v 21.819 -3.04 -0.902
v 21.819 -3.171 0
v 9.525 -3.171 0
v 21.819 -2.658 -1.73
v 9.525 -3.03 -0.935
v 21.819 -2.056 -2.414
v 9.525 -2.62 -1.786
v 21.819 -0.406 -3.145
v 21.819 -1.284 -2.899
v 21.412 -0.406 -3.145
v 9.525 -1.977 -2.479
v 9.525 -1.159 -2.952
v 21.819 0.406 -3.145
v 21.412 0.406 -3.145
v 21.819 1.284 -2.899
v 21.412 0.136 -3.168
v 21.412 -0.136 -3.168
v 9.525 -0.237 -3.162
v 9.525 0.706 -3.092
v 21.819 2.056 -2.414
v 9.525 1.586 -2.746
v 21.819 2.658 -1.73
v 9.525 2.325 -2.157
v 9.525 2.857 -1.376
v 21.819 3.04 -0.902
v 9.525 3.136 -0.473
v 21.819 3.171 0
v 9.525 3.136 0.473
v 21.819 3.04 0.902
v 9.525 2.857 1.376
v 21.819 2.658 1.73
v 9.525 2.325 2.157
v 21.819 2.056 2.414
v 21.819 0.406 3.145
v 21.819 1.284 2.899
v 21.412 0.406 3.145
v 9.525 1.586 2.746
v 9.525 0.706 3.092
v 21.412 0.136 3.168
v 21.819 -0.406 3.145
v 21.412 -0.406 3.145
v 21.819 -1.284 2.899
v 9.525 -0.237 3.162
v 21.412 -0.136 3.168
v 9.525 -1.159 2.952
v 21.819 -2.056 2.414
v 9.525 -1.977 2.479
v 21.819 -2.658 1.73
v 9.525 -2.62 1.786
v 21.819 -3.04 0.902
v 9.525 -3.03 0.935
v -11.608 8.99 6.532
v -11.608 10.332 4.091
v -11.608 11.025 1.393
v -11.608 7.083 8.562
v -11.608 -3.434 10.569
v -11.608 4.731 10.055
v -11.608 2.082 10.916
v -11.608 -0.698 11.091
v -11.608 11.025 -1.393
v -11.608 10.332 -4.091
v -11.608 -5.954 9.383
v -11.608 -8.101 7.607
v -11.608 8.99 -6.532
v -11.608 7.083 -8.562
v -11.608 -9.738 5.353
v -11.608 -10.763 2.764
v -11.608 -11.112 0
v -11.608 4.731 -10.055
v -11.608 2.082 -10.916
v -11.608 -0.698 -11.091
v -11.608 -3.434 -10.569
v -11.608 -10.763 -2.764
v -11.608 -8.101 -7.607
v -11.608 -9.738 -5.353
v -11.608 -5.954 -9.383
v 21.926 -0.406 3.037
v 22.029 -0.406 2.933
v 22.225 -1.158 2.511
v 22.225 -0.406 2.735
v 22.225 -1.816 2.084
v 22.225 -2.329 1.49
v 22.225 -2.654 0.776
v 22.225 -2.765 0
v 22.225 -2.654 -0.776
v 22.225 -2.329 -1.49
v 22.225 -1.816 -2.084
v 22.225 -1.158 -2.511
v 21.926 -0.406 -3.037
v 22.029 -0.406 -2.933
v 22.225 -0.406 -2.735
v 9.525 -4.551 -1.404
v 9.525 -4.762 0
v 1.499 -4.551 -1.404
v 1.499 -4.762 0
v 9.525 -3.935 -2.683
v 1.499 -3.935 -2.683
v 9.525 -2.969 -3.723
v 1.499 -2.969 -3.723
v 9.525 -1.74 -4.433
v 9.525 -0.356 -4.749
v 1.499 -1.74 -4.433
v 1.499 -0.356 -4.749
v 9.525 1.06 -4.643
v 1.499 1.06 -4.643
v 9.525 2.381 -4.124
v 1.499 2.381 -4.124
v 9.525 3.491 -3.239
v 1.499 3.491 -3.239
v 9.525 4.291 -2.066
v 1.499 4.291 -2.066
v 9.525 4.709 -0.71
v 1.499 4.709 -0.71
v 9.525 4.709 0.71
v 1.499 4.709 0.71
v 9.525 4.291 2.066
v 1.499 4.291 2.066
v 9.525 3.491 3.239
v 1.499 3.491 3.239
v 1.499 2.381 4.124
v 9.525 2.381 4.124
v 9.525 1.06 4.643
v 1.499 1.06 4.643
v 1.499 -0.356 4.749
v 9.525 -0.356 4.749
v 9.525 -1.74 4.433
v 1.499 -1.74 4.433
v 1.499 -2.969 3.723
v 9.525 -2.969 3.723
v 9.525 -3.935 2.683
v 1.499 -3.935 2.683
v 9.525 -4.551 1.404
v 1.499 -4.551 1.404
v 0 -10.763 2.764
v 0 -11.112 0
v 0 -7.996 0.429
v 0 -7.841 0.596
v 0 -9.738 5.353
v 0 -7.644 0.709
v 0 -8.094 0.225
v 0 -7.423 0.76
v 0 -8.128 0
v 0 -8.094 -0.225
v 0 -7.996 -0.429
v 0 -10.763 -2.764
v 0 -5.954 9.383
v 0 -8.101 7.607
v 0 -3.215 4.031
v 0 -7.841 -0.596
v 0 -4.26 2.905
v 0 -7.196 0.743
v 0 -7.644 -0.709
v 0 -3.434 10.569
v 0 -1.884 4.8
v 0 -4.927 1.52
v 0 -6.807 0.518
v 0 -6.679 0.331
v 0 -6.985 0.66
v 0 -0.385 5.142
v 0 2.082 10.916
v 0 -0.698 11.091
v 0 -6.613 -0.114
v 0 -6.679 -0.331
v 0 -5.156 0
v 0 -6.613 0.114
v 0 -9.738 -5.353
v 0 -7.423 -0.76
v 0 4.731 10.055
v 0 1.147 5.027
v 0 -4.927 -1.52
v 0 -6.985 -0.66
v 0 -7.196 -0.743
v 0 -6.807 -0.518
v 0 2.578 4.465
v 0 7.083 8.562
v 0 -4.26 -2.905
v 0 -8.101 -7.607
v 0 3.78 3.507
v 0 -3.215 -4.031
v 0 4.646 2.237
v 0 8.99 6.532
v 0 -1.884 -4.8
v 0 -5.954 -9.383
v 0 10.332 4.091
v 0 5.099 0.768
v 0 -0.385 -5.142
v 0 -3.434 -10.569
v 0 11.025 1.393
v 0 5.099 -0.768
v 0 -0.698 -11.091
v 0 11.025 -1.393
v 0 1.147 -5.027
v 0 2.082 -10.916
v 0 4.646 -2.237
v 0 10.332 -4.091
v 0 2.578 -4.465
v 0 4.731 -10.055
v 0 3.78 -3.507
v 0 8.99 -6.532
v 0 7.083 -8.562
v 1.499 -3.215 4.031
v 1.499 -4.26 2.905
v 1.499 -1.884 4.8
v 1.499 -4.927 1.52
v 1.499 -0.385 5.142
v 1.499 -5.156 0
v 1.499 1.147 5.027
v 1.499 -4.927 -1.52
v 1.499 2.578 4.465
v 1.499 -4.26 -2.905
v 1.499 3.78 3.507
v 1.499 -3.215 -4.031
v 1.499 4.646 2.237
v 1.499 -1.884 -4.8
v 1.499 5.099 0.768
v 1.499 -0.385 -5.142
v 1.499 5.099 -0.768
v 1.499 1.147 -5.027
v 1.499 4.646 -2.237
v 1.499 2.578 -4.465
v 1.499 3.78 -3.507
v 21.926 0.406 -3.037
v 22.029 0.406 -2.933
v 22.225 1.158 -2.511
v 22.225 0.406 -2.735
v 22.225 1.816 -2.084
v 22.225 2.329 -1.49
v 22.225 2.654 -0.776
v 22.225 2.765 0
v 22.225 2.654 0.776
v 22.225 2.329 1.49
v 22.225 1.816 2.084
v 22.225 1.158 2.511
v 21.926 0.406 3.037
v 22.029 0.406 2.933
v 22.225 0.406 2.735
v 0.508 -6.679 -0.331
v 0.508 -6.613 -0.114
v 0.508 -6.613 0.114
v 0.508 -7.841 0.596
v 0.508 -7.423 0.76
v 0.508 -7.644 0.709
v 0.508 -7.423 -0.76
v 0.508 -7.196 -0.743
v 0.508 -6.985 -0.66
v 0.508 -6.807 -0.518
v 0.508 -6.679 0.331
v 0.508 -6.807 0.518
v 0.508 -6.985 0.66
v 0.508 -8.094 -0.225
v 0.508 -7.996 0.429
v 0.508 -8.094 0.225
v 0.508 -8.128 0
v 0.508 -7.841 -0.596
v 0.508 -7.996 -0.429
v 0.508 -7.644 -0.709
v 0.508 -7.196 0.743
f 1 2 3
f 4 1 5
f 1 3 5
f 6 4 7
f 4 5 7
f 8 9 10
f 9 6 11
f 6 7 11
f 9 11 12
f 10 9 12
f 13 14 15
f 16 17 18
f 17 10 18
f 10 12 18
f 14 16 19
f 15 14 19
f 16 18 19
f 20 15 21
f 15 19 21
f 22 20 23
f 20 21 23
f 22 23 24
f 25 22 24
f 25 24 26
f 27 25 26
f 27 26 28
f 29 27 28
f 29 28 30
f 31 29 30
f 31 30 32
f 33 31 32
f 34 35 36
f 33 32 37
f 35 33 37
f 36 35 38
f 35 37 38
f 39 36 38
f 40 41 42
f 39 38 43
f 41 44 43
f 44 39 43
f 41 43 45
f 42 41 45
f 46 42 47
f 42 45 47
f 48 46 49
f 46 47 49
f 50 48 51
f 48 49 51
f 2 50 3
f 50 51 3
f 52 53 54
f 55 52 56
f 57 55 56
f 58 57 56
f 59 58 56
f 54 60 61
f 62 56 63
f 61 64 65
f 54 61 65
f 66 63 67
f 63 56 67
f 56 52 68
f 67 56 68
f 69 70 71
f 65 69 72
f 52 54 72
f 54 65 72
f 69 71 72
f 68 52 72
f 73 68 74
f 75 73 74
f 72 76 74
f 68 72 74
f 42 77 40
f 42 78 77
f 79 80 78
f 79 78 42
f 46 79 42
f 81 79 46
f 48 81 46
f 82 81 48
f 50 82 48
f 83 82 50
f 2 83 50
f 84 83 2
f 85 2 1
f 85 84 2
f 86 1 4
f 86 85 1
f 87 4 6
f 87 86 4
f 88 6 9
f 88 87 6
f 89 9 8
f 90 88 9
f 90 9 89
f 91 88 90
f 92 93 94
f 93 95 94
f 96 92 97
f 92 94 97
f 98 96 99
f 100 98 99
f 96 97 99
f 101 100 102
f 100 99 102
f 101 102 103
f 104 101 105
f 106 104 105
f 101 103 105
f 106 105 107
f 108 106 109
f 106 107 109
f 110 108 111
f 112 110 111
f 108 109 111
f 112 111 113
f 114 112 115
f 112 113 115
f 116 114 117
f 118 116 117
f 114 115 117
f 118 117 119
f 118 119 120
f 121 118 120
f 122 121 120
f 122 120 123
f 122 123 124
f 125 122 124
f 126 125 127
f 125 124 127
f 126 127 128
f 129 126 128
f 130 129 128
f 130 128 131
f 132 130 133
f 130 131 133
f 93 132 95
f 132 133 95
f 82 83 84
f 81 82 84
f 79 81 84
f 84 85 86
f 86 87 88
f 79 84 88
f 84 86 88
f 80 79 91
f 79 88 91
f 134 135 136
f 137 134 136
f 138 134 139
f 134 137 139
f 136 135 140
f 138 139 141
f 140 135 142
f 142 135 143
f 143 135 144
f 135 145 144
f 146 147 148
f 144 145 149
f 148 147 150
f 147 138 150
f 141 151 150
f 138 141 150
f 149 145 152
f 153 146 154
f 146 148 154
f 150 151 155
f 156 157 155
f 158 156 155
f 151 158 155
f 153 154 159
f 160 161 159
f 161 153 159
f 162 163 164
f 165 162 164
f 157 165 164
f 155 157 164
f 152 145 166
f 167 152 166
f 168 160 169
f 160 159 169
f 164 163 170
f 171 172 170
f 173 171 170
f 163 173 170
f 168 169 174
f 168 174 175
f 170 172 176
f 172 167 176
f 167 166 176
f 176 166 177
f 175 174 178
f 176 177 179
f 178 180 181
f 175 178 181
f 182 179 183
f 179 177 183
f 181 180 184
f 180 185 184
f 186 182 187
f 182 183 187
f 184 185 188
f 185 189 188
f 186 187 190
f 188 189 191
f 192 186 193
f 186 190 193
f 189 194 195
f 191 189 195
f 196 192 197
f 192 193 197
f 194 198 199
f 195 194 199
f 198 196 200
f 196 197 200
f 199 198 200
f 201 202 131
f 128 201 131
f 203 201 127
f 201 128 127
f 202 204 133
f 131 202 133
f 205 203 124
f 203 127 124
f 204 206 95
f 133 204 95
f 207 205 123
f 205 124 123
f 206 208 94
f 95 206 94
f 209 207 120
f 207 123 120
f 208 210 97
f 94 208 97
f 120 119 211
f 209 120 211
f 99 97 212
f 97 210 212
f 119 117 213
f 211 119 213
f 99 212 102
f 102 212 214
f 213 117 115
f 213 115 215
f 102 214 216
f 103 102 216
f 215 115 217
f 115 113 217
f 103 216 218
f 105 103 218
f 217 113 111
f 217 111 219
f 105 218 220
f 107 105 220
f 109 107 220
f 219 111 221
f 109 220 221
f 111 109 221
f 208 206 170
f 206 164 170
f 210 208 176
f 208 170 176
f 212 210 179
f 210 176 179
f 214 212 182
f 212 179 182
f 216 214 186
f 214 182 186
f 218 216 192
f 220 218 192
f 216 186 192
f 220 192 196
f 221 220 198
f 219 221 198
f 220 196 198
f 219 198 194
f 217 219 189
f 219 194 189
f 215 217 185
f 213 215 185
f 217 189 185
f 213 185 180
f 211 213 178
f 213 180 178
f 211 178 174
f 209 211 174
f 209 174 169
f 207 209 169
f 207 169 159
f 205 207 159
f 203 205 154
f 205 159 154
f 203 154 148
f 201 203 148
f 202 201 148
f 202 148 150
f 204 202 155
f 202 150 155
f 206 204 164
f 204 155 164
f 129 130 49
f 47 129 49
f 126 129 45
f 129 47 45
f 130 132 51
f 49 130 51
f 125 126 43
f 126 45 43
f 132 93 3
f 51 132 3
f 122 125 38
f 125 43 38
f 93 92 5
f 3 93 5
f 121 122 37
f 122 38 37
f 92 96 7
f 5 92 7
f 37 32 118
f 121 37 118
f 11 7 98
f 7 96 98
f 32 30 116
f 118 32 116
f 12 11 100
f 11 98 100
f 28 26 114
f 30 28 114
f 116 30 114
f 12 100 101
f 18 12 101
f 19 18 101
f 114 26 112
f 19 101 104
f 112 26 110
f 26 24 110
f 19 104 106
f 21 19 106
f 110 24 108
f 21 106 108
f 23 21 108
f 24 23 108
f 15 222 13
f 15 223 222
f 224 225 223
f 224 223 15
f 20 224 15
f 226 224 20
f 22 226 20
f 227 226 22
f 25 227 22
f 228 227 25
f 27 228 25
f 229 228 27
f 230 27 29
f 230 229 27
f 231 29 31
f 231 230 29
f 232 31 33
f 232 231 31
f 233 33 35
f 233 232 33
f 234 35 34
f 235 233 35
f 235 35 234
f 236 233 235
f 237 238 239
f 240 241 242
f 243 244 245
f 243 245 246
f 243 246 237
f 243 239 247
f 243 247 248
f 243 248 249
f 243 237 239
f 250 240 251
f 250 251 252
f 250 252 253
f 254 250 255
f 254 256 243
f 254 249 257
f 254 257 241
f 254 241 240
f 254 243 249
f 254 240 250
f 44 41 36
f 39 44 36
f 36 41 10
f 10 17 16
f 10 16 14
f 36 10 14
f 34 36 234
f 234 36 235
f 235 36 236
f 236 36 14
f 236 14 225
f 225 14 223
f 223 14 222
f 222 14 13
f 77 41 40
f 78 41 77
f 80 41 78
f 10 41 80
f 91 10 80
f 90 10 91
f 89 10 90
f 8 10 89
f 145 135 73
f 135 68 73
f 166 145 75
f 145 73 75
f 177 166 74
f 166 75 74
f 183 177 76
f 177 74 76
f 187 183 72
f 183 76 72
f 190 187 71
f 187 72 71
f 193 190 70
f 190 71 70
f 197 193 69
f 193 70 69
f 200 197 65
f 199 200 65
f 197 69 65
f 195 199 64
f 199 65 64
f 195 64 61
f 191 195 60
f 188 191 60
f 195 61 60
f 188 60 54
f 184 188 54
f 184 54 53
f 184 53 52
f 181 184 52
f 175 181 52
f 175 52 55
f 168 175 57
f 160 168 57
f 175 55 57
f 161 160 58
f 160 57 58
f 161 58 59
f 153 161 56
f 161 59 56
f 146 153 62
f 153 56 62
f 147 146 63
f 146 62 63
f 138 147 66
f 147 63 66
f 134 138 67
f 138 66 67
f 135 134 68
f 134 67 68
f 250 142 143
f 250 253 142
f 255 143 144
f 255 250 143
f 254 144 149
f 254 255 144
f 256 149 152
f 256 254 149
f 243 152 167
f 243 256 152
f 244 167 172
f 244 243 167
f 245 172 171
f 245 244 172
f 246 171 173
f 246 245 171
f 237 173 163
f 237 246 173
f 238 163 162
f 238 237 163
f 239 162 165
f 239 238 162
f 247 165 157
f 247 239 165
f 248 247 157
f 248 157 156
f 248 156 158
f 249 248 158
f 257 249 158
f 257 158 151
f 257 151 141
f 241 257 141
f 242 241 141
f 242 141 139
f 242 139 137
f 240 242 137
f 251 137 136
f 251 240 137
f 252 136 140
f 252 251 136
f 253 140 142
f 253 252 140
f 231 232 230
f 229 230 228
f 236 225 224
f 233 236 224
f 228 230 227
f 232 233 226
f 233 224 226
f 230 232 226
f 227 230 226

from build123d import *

# Parameters (mm, degrees)
SKETCH3_R               = 0.762
BOSS_EXTRUDE1_DEPTH     = 0.508
CUT_EXTRUDE1_DEPTH      = 28.219954767
CUT_EXTRUDE1_DEPTH_BACK = 28.219954767
SKETCH4_W               = 0.8128
SKETCH4_H               = 0.8128
CHAMFER1_SIZE           = 0.4064


with BuildPart() as part:
    # Sketch2 → Revolve1 (revolve)
    with BuildSketch(Plane.XY):
        Polygon((0, 0), (22.225, 0), (22.225, 3.17119), (9.525, 3.17119), (9.525, 4.7625), (1.4986, 4.7625), (1.4986, 5.1562), (0, 5.1562), (0, 11.1125), (-11.6078, 11.1125), (-11.6078, 0), align=None)
    revolve(axis=Axis((22.225, 0, 0), (1, 0, 0)))

    # Sketch3 → Boss-Extrude1 (add, symmetric)
    with BuildSketch(Plane(origin=(0, 0, 0), x_dir=(0, 0, -1), z_dir=(1, 0, 0))):
        with Locations((0, -7.366)):
            Circle(SKETCH3_R)
    extrude(amount=BOSS_EXTRUDE1_DEPTH, both=True)

    # Sketch4 → Cut-Extrude1 (cut, two sides: drawn at the far end of the back side and taken through both)
    with BuildSketch(Plane.XY.offset(-CUT_EXTRUDE1_DEPTH_BACK)):
        with Locations((21.8186, 0)):
            Rectangle(SKETCH4_W, SKETCH4_H)
    extrude(amount=CUT_EXTRUDE1_DEPTH + CUT_EXTRUDE1_DEPTH_BACK, mode=Mode.SUBTRACT)

    # Chamfer1
    chamfer1_edges = [part.edges().sort_by_distance(p)[0] for p in [
        (22.225, -3.17119, 0),
        (22.225, 2.381723917, 2.093761496),
    ]]
    chamfer(chamfer1_edges, length=CHAMFER1_SIZE)


solid = part.part
